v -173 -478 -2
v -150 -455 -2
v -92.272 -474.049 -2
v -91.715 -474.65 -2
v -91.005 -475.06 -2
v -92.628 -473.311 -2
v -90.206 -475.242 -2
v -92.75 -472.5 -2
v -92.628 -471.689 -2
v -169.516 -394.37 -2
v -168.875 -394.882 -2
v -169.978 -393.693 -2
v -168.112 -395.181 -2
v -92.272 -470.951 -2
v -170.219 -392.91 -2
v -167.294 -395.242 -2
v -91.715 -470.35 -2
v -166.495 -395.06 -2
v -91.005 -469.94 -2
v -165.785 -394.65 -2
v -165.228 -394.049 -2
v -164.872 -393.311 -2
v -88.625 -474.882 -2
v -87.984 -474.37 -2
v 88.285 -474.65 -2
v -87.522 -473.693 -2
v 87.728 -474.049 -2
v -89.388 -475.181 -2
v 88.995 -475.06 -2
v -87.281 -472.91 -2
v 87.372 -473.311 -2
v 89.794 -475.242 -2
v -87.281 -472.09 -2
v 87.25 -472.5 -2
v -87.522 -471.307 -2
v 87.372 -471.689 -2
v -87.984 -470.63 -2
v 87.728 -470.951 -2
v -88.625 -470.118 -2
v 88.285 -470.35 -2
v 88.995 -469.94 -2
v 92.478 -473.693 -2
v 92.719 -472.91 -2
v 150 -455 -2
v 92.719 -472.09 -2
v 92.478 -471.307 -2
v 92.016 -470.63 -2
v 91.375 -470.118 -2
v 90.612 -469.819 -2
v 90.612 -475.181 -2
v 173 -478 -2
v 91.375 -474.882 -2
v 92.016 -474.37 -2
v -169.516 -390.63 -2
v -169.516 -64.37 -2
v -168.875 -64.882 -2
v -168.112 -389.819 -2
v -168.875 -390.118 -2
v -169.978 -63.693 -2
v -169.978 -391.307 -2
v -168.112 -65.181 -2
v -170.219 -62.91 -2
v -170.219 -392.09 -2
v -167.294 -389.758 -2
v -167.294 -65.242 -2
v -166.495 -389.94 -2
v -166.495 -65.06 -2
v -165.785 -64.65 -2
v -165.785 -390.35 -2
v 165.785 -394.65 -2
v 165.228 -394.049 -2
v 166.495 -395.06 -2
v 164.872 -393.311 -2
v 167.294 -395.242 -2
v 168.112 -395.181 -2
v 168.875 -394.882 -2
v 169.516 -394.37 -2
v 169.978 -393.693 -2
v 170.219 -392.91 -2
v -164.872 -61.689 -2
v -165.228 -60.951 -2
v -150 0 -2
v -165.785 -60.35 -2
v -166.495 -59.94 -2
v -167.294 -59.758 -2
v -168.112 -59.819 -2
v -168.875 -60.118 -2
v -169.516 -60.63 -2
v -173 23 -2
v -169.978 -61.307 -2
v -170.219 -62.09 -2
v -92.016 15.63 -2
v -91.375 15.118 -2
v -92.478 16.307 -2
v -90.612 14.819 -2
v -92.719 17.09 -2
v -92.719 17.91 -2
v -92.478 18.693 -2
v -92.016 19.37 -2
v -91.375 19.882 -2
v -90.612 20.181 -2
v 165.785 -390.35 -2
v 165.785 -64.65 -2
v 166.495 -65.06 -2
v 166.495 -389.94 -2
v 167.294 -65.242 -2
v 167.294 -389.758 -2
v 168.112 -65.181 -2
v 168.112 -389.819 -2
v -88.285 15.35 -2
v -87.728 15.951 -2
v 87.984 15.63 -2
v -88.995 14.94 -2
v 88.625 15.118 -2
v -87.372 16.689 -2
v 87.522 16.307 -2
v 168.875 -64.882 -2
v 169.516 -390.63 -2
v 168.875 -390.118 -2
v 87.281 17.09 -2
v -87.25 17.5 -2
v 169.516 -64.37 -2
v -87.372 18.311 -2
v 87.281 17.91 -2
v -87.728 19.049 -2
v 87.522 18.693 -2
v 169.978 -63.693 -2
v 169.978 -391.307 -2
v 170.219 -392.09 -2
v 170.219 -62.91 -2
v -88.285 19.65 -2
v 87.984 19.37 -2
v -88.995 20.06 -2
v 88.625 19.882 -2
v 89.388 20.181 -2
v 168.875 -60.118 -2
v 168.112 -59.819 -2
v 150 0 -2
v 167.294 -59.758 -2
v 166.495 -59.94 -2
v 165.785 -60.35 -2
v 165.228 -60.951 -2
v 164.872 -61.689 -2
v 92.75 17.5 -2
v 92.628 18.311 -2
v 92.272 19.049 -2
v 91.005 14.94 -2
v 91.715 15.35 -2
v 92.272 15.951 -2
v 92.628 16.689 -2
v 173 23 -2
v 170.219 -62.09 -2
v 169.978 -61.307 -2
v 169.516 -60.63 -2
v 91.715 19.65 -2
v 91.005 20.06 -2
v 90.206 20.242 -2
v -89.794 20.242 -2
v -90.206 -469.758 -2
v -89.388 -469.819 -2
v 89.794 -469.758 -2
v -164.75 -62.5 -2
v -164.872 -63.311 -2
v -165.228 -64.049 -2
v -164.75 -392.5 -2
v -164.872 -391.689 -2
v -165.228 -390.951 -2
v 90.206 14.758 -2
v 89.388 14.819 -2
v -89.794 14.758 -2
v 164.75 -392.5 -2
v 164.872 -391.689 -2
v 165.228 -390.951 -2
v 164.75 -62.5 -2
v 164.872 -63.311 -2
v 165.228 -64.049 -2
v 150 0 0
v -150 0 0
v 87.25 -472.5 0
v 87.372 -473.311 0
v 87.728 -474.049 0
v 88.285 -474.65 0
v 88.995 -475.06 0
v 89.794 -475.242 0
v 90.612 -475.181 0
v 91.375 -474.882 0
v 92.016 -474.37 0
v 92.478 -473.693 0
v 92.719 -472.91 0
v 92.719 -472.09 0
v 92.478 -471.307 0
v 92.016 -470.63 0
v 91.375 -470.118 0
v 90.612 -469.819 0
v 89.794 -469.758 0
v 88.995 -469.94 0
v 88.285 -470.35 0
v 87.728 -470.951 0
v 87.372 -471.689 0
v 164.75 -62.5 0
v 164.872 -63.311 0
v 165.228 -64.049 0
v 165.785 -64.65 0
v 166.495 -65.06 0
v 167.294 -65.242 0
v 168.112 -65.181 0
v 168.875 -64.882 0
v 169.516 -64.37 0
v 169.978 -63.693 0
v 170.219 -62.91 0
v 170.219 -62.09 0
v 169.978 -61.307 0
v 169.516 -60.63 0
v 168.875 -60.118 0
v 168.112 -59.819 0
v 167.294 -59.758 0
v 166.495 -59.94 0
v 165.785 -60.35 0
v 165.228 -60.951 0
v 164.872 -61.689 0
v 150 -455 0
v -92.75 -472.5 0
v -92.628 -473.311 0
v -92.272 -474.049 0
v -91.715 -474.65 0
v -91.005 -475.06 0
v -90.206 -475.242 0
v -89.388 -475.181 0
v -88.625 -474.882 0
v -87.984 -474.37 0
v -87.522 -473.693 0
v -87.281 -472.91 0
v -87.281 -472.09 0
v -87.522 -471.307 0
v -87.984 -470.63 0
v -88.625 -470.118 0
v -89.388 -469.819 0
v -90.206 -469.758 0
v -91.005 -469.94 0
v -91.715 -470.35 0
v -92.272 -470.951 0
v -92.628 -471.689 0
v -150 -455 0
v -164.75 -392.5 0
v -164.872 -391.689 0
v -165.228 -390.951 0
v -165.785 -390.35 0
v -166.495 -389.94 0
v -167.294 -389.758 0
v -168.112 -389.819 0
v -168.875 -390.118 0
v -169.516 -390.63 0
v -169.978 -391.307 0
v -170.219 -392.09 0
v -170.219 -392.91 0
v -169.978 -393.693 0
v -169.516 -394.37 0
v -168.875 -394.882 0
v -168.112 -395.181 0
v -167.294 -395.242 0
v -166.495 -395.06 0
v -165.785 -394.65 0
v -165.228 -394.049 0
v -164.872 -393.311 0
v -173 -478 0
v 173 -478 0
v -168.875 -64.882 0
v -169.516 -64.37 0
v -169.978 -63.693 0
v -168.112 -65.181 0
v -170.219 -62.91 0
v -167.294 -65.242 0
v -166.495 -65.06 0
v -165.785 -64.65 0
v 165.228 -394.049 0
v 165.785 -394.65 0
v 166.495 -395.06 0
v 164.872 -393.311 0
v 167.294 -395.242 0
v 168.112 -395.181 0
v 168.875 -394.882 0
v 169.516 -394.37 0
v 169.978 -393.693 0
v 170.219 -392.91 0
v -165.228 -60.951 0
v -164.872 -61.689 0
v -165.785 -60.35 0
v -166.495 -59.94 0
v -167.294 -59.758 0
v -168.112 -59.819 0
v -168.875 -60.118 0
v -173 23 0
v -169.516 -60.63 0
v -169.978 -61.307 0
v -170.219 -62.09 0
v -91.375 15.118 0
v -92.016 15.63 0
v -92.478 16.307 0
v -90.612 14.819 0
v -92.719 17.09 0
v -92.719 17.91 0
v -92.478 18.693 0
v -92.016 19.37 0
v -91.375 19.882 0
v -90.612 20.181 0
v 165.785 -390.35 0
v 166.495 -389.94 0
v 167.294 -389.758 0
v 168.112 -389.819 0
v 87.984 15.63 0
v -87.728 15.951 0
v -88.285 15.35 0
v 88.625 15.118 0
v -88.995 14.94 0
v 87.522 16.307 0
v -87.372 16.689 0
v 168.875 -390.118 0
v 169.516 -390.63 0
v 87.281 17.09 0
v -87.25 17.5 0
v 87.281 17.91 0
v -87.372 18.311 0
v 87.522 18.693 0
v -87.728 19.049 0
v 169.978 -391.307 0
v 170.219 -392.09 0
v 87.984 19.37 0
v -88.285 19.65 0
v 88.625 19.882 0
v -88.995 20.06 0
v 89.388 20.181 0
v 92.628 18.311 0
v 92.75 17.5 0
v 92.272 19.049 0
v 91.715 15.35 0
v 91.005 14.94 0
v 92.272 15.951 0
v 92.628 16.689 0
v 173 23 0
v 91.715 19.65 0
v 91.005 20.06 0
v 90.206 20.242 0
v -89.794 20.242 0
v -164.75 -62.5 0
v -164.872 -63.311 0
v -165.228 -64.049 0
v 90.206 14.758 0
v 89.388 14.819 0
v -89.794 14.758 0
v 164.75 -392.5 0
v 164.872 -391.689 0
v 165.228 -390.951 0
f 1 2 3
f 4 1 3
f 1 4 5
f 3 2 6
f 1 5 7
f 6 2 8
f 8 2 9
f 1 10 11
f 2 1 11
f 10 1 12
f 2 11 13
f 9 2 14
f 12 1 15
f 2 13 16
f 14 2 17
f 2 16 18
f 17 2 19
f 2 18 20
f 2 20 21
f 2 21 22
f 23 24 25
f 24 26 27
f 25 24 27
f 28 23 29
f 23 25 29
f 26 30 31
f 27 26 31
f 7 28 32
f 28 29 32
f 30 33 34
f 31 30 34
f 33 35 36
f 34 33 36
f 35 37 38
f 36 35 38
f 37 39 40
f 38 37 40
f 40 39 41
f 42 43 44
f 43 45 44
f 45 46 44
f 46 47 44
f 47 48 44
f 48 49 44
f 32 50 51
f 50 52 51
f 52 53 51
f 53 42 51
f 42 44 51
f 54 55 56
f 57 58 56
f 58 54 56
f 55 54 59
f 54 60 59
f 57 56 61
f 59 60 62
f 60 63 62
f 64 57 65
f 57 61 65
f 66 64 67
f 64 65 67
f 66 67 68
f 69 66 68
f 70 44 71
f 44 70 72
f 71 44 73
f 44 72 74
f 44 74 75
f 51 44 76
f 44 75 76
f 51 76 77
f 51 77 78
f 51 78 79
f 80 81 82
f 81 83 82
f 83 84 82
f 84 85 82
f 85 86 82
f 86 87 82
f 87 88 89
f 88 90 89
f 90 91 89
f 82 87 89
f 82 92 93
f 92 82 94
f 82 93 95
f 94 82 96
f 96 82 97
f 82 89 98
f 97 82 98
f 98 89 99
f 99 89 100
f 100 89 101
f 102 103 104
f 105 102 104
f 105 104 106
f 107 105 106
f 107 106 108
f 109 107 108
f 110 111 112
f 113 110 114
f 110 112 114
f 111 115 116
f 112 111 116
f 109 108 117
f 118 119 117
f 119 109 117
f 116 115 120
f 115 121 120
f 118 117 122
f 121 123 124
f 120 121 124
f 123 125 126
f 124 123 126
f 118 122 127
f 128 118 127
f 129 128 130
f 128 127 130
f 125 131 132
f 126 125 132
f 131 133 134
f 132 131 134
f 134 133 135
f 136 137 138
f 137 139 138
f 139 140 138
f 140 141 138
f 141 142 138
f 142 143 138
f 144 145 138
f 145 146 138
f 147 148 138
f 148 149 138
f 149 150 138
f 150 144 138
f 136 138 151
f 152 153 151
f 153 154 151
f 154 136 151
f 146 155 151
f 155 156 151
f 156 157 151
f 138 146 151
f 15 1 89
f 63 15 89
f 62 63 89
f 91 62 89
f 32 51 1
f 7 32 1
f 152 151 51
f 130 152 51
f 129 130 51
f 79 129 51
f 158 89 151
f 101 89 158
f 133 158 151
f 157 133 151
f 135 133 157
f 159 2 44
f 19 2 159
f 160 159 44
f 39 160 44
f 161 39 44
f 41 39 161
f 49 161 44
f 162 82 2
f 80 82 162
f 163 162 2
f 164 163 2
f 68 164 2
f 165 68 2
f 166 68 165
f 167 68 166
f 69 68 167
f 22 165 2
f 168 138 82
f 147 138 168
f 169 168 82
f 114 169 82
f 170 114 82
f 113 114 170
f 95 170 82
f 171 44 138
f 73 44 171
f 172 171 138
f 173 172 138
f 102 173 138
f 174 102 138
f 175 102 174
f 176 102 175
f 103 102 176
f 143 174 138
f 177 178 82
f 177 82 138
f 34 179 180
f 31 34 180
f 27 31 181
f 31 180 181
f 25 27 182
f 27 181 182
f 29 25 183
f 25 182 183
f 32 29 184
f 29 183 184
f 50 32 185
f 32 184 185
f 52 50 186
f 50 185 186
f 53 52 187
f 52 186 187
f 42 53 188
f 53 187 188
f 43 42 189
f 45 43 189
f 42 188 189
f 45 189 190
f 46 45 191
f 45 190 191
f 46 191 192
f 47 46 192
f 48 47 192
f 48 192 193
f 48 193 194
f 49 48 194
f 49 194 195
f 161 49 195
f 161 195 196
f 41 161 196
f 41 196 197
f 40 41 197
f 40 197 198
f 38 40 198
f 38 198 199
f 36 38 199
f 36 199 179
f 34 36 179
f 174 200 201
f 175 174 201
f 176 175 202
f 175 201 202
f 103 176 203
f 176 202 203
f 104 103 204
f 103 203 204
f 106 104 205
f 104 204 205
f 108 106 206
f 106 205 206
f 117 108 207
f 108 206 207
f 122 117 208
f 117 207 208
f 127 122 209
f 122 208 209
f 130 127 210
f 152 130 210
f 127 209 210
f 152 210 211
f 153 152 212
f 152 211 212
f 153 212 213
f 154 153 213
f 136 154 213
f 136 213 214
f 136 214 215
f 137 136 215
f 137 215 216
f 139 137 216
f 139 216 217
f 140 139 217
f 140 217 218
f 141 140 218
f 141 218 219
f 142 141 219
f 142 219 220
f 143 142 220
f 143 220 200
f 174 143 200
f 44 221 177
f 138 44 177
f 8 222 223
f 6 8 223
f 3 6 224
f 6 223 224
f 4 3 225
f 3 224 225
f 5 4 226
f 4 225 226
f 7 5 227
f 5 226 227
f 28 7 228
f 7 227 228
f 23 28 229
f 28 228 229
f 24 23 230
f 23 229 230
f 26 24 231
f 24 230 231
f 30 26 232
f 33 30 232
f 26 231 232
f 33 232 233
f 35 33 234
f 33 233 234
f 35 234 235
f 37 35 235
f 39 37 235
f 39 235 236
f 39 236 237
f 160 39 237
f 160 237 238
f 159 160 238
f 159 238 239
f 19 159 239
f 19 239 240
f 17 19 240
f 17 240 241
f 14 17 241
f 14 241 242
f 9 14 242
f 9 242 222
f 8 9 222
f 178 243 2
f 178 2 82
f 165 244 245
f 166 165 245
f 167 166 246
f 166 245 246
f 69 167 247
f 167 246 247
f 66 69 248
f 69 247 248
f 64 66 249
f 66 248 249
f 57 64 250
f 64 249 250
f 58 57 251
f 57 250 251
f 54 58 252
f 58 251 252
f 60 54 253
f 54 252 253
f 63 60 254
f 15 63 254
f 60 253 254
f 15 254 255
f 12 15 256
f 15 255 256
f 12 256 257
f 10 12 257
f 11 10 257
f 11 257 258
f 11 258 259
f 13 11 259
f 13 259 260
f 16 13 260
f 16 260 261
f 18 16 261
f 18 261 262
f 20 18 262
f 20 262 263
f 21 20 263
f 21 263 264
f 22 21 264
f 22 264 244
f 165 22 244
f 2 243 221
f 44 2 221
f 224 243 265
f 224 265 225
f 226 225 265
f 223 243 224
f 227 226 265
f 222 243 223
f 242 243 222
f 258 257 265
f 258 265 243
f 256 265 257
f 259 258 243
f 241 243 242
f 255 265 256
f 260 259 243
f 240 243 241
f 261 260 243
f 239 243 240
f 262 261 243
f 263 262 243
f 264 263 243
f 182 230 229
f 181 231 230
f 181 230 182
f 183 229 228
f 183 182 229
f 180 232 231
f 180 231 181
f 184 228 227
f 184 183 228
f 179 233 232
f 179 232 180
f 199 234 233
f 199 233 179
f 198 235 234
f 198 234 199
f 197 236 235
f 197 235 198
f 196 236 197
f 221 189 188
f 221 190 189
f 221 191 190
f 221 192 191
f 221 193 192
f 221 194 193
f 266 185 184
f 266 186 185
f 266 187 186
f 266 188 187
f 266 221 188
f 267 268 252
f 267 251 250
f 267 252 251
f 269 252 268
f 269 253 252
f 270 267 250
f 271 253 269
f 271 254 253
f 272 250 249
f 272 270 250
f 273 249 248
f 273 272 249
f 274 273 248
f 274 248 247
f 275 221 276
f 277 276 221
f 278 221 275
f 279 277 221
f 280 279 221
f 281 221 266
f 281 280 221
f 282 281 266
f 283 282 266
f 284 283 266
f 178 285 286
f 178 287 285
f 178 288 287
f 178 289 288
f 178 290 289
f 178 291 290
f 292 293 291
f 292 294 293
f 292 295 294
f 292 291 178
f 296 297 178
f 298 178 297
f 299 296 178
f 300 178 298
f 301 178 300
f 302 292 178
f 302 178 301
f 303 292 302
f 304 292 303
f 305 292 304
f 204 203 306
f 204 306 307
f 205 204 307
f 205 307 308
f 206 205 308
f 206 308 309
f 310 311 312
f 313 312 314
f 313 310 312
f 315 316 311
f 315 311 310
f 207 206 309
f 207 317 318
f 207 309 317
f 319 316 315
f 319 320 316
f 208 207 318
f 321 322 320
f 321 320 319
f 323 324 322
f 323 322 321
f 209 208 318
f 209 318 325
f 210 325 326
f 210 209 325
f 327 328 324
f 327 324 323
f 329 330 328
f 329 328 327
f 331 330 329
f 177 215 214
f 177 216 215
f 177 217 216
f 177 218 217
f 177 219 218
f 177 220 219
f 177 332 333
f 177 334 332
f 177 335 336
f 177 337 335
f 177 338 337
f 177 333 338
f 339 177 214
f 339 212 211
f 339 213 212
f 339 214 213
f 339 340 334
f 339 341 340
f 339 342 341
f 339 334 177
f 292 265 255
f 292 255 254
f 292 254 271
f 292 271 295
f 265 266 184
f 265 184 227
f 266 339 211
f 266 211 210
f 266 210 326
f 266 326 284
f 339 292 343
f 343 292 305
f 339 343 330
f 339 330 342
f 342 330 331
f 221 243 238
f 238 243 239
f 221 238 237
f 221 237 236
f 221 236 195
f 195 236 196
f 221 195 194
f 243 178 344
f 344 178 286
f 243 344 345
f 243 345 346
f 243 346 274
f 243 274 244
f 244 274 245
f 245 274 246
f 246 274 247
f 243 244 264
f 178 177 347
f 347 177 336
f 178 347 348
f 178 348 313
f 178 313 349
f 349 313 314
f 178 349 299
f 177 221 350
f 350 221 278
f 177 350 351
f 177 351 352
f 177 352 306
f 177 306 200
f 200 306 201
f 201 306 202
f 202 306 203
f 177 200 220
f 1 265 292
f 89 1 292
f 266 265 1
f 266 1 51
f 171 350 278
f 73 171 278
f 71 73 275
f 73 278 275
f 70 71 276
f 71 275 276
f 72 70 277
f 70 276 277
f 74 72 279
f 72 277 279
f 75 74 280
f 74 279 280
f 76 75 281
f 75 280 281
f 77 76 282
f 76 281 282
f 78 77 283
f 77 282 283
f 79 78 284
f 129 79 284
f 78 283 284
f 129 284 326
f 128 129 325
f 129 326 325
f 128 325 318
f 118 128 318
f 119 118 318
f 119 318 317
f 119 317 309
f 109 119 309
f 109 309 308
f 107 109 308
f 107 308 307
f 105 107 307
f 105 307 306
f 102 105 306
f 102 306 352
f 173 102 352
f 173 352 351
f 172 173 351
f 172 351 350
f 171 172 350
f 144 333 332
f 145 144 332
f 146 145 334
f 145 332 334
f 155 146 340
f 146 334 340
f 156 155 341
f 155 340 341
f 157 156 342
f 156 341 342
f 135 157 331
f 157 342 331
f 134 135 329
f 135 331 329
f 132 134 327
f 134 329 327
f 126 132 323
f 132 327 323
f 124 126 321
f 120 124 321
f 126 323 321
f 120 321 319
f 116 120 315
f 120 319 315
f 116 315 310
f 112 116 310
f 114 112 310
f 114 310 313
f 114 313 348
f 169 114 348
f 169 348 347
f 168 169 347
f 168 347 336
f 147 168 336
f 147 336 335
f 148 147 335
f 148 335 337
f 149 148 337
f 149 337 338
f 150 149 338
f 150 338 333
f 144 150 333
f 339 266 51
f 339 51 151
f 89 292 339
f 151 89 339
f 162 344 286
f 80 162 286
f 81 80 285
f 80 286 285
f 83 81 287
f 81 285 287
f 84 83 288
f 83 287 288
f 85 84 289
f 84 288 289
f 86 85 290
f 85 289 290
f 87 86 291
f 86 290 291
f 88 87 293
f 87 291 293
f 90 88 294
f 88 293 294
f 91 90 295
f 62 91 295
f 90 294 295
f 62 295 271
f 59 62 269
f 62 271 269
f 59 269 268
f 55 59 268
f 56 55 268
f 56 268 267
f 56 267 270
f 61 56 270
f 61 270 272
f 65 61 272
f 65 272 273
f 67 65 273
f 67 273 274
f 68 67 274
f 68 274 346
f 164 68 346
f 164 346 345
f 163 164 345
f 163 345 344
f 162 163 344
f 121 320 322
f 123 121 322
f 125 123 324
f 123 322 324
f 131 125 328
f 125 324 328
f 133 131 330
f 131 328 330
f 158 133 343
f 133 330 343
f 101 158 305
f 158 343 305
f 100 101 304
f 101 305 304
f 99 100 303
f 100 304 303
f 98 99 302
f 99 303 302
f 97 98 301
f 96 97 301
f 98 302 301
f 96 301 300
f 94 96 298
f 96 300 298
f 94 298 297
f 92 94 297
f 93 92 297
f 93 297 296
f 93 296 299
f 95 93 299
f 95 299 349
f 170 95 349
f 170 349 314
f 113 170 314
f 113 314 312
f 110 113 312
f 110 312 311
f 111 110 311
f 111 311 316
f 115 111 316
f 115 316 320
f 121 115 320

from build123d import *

# Parameters (mm, degrees)
IZIM1_W               = 346
IZIM1_H               = 501
IZIM1_W_2             = 300
IZIM1_H_2             = 455
TABAN_FLAN_1_DEPTH    = 2
IZIM2_R               = 2.75
KES_EKSTR_ZYON1_DEPTH = 10


# Sheet-metal steps are written as plain solids
with BuildPart() as part:
    # Çizim1 → Taban-Flanş1 (new body)
    with BuildSketch(Plane.XY):
        with Locations((0, -227.5)):
            Rectangle(IZIM1_W, IZIM1_H)
        with Locations((0, -227.5)):
            Rectangle(IZIM1_W_2, IZIM1_H_2, mode=Mode.SUBTRACT)
    extrude(amount=-TABAN_FLAN_1_DEPTH)

    # Çizim2 → Kes-Ekstrüzyon1 (cut)
    with BuildSketch(Plane.XY):
        with Locations((90, 17.5)):
            Circle(IZIM2_R)
        with Locations((-90, 17.5)):
            Circle(IZIM2_R)
        with Locations((-167.5, -62.5)):
            Circle(IZIM2_R)
        with Locations((-167.5, -392.5)):
            Circle(IZIM2_R)
        with Locations(Location((167.5, -392.5, 0), (0, 0, 180))):
            Circle(IZIM2_R)
        with Locations(Location((167.5, -62.5, 0), (0, 0, 180))):
            Circle(IZIM2_R)
        with Locations(Location((90, -472.5, 0), (0, 0, 180))):
            Circle(IZIM2_R)
        with Locations(Location((-90, -472.5, 0), (0, 0, 180))):
            Circle(IZIM2_R)
    extrude(amount=-KES_EKSTR_ZYON1_DEPTH, mode=Mode.SUBTRACT)


solid = part.part
